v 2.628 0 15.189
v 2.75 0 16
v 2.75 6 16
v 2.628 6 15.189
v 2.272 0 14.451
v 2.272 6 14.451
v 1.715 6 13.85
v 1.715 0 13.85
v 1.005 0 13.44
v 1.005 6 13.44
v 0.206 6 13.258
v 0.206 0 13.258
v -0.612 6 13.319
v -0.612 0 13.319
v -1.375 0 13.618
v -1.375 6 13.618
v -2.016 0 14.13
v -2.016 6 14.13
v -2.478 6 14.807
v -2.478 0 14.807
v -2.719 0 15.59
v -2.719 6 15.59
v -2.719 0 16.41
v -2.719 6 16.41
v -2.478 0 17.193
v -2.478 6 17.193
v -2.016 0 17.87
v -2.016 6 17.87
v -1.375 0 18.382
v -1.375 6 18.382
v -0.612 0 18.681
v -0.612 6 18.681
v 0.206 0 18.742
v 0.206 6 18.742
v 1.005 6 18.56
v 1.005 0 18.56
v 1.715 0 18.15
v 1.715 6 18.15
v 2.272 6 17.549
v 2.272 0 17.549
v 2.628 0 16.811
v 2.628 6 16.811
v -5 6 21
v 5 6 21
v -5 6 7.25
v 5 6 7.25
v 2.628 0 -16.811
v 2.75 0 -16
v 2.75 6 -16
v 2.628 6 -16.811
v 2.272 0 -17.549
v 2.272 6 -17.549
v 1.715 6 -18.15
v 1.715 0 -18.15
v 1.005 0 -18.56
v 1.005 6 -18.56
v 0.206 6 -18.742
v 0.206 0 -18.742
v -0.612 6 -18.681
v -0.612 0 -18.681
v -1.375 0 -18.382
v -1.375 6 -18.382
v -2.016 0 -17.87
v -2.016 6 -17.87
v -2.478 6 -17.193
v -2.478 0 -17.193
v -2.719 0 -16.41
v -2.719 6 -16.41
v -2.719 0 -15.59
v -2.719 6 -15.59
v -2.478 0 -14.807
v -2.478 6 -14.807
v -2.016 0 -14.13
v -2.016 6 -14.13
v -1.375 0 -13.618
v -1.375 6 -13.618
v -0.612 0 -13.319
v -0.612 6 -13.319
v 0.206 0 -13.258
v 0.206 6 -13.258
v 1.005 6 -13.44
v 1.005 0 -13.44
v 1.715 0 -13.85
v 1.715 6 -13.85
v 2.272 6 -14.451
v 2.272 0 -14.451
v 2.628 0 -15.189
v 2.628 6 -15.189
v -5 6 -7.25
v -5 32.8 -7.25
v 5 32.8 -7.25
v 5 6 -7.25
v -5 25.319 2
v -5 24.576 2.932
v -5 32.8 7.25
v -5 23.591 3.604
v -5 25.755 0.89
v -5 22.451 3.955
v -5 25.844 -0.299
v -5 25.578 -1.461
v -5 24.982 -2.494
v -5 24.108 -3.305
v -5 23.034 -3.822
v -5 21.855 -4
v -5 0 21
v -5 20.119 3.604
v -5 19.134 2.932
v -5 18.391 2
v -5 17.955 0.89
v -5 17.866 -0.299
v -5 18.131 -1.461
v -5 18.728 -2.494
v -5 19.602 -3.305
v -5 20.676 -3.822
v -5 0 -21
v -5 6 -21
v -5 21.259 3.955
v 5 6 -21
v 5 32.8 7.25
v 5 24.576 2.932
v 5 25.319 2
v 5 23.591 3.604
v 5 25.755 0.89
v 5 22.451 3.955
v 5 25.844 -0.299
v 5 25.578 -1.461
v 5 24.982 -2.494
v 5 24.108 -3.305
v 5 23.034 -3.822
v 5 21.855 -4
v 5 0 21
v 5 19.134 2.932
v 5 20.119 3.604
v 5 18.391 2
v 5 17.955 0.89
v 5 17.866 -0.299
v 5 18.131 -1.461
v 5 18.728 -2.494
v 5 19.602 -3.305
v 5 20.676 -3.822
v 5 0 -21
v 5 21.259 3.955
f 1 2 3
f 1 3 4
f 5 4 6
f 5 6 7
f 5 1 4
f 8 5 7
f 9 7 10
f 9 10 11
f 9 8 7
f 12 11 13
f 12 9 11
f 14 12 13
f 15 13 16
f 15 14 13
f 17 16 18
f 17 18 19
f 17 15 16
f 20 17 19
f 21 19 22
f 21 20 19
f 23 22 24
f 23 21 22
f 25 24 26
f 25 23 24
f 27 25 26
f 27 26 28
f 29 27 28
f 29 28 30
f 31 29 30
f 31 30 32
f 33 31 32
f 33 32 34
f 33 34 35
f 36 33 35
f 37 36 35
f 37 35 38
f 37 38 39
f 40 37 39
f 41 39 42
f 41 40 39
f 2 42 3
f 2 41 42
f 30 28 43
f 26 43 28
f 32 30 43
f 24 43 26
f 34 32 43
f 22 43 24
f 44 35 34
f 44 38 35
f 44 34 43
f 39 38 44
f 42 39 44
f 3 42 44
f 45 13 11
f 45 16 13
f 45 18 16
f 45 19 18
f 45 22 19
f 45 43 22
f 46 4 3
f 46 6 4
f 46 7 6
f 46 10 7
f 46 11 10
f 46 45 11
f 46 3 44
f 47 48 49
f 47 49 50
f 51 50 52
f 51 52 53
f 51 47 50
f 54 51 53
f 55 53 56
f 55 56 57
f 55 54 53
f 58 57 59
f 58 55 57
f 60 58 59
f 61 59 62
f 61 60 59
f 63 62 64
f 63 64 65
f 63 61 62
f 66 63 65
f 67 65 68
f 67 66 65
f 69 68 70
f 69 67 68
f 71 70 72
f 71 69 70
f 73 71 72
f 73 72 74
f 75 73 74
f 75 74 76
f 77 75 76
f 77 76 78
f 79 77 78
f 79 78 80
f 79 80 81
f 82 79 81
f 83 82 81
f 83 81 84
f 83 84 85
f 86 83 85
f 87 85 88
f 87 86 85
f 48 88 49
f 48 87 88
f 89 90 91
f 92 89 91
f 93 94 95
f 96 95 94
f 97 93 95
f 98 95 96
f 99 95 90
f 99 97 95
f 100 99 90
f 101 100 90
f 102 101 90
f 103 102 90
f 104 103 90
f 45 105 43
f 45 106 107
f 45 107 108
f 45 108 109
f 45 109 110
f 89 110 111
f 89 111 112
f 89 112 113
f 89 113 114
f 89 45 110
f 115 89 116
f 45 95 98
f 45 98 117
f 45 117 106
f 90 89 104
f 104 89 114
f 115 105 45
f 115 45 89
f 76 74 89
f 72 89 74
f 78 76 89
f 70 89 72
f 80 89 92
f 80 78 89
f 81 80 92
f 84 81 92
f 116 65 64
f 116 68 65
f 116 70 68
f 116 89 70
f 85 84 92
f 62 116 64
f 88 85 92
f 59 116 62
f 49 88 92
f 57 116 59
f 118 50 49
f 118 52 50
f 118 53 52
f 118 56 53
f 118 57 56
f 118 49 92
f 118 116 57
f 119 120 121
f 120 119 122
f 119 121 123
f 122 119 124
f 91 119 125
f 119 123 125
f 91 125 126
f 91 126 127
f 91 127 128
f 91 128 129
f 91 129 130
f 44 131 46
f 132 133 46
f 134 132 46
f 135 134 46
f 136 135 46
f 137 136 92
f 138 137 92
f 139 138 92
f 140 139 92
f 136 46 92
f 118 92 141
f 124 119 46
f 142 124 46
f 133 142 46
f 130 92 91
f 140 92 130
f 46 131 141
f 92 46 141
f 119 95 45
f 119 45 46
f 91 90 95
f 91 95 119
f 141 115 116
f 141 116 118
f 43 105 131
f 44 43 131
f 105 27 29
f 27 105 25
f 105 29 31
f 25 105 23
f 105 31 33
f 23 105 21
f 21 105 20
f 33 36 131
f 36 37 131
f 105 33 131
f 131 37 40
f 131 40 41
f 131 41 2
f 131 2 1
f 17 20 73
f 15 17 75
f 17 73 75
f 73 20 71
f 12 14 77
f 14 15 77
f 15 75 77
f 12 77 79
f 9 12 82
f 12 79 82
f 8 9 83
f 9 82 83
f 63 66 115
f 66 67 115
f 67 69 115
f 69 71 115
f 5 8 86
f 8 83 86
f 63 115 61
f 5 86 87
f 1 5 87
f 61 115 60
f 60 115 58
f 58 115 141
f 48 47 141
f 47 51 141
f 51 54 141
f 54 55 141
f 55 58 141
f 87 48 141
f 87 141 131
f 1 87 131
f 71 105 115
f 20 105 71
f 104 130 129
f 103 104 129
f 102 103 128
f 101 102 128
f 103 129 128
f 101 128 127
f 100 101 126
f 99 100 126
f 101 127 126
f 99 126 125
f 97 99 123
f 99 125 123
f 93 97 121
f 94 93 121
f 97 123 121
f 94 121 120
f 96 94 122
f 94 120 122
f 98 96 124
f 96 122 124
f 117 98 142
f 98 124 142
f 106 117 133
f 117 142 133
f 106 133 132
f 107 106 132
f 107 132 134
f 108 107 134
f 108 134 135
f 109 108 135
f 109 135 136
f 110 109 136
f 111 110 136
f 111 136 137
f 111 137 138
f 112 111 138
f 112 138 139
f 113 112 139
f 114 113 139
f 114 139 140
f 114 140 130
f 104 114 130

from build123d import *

# Parameters (mm, degrees)
SKETCH1_W             = 10
SKETCH1_H             = 13.75
SKETCH1_R             = 2.75
BOSS_EXTRUDE1_DEPTH   = 6
BOSS_EXTRUDE1_2_DEPTH = 6
SKETCH1_3_W           = 10
SKETCH1_3_H           = 14.5
BOSS_EXTRUDE2_DEPTH   = 32.8
SKETCH2_R             = 4
CUT_EXTRUDE1_DEPTH    = 32.8


with BuildPart() as part:
    # Sketch1 → Boss-Extrude1 (new body)
    with BuildSketch(Plane(origin=(0, 0, 0), x_dir=(1, 0, 0), z_dir=(0, 1, 0))):
        with Locations((0, 14.125)):
            Rectangle(SKETCH1_W, SKETCH1_H)
        with Locations((0, 16)):
            Circle(SKETCH1_R, mode=Mode.SUBTRACT)
    extrude(amount=BOSS_EXTRUDE1_DEPTH)



with BuildPart() as body_2:
    # Sketch1 → Boss-Extrude1 2 (new body)
    with BuildSketch(Plane(origin=(0, 0, 0), x_dir=(1, 0, 0), z_dir=(0, 1, 0))):
        with Locations((0, -14.125)):
            Rectangle(SKETCH1_W, SKETCH1_H)
        with Locations((0, -16)):
            Circle(SKETCH1_R, mode=Mode.SUBTRACT)
    extrude(amount=BOSS_EXTRUDE1_2_DEPTH)


with BuildPart() as part_1:
    add(part.part)

    add(body_2.part)  # Boss-Extrude2 merges body 2
    # Sketch1<3> → Boss-Extrude2 (add)
    with BuildSketch(Plane(origin=(0, 0, 0), x_dir=(1, 0, 0), z_dir=(0, 1, 0))):
        Rectangle(SKETCH1_3_W, SKETCH1_3_H)
    extrude(amount=BOSS_EXTRUDE2_DEPTH)

    # Sketch2 → Cut-Extrude1 (cut)
    with BuildSketch(Plane(origin=(5, 0, 0), x_dir=(0, 0, -1), z_dir=(1, 0, 0))):
        with Locations((0, 21.854969952)):
            Circle(SKETCH2_R)
    extrude(amount=-CUT_EXTRUDE1_DEPTH, mode=Mode.SUBTRACT)


solid = part_1.part
